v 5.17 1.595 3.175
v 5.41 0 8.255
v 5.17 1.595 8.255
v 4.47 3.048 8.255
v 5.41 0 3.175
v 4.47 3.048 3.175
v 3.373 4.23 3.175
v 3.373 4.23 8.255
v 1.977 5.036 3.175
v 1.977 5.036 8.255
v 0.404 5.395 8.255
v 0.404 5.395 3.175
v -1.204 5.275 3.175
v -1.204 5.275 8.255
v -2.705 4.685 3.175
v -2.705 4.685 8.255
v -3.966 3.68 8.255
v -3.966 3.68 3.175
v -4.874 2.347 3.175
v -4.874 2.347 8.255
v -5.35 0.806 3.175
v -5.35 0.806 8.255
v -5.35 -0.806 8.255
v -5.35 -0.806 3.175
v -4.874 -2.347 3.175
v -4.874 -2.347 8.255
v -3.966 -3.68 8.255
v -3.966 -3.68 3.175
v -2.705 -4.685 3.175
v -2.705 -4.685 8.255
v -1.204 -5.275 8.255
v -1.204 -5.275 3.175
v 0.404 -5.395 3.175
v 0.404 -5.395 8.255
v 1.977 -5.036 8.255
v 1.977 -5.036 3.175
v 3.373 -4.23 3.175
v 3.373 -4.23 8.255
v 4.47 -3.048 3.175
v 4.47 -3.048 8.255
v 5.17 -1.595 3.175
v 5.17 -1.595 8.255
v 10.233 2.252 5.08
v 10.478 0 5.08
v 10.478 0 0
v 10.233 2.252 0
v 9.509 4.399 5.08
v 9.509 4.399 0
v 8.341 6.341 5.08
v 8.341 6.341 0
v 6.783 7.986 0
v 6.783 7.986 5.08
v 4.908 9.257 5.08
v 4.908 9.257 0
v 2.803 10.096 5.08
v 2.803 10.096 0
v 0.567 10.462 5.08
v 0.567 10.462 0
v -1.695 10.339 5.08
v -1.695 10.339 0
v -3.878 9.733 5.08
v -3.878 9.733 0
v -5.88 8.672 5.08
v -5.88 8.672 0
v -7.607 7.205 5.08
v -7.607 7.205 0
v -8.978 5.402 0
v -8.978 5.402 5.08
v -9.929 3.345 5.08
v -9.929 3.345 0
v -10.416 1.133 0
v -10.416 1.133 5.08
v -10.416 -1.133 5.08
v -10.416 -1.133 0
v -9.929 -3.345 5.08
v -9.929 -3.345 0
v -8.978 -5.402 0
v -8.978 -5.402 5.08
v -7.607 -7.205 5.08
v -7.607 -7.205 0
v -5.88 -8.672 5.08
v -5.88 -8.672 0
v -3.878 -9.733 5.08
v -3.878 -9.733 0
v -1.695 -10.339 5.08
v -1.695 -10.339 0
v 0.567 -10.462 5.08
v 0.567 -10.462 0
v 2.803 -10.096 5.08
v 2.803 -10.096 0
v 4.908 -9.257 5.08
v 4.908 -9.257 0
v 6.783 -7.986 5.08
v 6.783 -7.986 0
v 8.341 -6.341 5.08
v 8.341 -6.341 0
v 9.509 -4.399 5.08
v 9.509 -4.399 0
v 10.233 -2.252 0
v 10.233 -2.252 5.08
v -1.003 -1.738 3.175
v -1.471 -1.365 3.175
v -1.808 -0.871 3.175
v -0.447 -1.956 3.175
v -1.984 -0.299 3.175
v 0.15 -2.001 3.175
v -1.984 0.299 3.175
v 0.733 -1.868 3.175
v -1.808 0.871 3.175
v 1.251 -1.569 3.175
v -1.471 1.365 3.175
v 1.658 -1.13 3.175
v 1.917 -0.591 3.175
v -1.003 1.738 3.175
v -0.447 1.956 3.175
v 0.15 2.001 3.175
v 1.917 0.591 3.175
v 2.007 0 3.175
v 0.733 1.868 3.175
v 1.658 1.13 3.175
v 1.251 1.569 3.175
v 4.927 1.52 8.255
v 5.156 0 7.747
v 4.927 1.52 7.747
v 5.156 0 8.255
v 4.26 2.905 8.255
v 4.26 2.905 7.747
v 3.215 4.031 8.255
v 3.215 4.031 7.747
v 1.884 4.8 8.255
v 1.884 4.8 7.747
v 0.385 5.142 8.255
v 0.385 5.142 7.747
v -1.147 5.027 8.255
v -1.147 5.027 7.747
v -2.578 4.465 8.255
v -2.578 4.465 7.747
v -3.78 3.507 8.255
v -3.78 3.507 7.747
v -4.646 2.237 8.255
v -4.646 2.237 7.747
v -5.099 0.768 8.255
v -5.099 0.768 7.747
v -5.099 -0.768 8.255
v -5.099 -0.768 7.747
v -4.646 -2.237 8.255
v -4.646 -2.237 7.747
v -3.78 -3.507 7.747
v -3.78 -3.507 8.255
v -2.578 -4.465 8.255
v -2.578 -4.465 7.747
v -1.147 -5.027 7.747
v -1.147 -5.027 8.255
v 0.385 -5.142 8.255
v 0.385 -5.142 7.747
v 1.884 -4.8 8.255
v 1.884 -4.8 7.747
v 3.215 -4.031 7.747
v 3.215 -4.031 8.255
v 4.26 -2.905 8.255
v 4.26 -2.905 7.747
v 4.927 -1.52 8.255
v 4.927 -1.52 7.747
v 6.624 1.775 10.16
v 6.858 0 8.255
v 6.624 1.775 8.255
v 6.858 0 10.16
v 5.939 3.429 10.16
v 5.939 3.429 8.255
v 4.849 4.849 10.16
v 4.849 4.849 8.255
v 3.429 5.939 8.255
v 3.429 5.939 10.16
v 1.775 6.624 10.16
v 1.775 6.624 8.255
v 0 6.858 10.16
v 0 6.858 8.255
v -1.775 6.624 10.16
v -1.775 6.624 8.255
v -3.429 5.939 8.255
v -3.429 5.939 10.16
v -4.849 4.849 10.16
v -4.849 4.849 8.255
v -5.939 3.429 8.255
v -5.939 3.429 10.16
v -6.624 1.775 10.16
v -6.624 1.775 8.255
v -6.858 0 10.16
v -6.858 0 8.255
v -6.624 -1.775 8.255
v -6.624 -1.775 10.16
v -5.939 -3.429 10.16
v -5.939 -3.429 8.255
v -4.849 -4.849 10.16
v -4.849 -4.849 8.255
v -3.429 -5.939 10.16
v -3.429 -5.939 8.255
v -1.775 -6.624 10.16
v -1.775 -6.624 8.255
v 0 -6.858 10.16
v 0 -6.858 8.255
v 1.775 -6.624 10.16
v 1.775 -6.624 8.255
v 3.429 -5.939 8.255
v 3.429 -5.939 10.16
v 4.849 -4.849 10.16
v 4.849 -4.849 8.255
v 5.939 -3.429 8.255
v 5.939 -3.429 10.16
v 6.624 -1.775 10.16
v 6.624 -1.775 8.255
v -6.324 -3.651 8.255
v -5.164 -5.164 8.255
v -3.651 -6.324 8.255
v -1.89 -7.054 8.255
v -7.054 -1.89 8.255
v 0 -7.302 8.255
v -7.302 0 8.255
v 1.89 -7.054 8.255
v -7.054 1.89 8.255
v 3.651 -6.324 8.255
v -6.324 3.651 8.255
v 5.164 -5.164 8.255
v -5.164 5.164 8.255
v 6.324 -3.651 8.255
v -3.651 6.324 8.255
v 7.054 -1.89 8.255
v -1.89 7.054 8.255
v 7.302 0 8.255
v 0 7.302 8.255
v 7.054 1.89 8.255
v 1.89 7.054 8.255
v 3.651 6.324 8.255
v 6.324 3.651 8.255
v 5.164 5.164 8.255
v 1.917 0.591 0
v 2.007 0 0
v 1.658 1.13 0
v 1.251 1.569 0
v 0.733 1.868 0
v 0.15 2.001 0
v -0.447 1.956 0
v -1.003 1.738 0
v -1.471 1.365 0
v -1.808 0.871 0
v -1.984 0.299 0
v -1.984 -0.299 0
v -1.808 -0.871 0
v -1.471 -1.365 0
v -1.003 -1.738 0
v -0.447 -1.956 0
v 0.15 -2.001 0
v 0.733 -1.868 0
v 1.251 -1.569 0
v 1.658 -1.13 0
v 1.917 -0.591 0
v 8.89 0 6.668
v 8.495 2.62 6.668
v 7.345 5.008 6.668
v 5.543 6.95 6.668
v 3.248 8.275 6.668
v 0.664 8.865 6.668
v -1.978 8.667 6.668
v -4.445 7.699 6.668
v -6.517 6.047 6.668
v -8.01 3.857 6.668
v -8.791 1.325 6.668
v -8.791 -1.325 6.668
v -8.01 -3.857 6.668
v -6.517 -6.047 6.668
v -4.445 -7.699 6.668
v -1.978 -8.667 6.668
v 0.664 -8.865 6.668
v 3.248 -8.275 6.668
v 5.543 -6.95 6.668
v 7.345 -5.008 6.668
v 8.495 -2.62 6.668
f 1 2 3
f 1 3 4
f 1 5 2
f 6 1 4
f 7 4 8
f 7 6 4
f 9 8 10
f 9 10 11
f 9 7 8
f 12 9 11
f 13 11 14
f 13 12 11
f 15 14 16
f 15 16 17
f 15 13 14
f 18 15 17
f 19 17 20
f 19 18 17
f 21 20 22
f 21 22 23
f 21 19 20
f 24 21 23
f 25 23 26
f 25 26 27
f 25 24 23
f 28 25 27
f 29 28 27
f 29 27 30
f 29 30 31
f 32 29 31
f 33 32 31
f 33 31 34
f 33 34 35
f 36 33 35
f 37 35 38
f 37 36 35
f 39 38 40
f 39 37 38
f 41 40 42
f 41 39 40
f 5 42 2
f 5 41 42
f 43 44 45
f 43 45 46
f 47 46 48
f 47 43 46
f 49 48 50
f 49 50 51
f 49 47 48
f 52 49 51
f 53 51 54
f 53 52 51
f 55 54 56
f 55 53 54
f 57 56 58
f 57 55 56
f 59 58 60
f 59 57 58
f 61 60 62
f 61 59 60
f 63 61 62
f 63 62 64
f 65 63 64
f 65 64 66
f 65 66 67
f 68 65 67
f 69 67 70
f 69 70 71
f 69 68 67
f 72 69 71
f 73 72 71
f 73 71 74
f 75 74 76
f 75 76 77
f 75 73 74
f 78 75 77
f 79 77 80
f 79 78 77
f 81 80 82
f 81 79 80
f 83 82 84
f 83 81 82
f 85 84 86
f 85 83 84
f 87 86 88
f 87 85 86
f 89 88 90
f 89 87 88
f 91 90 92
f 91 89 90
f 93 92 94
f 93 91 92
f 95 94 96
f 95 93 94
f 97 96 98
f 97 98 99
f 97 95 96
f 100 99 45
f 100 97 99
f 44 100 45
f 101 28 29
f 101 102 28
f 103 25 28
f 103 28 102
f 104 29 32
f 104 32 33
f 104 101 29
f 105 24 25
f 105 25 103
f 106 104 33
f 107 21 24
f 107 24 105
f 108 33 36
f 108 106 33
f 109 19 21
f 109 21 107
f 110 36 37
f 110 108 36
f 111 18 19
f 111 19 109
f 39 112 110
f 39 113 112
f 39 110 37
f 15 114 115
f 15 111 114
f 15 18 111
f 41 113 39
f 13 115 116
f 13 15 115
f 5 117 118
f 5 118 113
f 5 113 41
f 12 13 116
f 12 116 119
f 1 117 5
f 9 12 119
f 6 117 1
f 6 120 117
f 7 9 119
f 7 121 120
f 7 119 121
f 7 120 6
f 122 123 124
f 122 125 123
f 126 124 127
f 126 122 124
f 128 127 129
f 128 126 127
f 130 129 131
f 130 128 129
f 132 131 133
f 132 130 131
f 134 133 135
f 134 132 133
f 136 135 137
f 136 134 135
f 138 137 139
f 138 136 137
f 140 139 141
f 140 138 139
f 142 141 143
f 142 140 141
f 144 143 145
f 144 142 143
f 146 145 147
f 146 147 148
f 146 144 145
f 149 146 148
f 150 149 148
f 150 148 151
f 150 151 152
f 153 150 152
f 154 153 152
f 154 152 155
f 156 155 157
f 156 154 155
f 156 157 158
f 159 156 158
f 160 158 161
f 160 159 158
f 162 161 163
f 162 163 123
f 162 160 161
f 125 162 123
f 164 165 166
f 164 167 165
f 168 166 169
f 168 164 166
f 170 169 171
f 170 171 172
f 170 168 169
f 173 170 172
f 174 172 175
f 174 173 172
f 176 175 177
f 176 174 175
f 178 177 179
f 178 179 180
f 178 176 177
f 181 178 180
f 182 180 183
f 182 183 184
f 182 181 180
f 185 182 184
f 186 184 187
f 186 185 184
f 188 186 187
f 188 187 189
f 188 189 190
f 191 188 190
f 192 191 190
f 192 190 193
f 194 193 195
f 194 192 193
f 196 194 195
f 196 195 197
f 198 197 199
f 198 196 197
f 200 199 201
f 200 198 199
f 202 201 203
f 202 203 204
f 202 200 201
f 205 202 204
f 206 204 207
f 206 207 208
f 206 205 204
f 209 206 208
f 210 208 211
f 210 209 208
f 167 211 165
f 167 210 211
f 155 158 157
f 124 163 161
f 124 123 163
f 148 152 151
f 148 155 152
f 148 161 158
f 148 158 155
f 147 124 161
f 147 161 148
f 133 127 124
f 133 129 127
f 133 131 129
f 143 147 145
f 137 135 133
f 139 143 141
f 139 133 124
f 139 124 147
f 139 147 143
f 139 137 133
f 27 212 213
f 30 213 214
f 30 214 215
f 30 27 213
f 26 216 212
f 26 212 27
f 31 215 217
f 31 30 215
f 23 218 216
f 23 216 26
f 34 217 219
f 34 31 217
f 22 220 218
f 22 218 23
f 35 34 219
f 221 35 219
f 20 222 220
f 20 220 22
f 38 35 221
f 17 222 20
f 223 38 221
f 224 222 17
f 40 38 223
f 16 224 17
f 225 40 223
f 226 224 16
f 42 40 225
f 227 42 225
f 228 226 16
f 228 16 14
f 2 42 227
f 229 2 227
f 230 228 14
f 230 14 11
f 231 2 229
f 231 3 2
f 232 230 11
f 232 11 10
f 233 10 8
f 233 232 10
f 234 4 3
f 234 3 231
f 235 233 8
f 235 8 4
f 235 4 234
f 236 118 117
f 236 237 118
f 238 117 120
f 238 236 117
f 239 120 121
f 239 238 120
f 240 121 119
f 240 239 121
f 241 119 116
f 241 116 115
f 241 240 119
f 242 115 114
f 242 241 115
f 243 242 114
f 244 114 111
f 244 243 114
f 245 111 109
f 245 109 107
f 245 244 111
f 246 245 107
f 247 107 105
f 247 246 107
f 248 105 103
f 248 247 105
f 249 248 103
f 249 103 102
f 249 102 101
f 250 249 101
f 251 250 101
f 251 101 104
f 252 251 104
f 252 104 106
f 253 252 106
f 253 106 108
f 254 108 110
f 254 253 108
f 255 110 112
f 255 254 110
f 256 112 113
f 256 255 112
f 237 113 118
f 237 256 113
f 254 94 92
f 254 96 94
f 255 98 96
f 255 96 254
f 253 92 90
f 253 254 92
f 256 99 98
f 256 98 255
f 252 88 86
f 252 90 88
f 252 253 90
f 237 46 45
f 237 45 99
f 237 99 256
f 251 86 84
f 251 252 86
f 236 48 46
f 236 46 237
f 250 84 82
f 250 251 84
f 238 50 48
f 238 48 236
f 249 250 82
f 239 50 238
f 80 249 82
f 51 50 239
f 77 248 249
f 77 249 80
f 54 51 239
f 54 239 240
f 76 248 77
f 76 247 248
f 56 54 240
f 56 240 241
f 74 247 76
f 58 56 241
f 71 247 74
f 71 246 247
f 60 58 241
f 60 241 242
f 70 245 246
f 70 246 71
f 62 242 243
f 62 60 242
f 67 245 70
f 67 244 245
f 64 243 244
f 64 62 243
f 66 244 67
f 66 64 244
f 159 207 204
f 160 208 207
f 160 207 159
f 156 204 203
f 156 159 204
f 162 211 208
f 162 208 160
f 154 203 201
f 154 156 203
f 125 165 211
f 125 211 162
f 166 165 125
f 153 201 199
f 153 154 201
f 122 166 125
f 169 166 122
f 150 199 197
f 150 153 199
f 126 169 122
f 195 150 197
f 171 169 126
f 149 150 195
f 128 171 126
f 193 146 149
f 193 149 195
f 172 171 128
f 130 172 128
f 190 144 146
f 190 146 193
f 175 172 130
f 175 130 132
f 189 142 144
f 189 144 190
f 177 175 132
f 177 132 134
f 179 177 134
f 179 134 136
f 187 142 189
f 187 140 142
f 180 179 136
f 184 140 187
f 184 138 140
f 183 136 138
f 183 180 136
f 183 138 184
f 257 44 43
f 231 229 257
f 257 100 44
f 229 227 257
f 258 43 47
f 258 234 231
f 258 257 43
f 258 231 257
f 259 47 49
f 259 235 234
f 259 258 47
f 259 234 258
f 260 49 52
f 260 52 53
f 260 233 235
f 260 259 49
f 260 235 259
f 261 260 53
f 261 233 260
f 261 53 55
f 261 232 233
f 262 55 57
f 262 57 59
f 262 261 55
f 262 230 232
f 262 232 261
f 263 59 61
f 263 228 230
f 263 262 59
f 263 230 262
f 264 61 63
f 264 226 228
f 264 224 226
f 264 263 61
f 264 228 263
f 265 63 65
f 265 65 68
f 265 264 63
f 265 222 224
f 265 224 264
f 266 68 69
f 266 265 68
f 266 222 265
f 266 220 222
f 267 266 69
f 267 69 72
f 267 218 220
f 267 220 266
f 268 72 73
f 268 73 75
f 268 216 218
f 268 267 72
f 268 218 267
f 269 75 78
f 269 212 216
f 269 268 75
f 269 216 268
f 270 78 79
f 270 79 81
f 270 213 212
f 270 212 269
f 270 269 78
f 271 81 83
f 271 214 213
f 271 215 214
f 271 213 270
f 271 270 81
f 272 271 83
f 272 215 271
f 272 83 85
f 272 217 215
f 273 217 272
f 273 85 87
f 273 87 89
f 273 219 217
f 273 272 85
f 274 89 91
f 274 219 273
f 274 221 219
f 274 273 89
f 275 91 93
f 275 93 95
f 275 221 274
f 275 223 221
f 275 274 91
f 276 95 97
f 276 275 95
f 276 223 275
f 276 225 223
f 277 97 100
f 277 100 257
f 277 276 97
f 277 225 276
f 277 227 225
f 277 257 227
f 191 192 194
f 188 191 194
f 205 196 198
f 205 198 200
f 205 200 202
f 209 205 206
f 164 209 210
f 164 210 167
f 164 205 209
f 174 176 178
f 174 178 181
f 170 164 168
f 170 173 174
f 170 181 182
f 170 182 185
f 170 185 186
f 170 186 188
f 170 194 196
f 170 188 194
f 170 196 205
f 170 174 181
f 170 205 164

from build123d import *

# Parameters (mm, degrees)
F2_SIZE = 3.175


with BuildPart() as f1:
    # F0 (on Front) → F1 (revolve)
    with BuildSketch(Plane.XZ):
        Polygon((2.0066, 3.175), (2.0066, 0), (10.4775, 0), (10.4775, 8.255), (5.4102, 8.255), (5.4102, 3.175), align=None)
    revolve(axis=Axis((0, 0, 4.1275), (0, 0, 1)))

    # F2
    f2_edges = [f1.edges().sort_by_distance(p)[0] for p in [
        (-10.4775, 0, 8.255),
    ]]
    chamfer(f2_edges, length=F2_SIZE)


with BuildPart() as f4:
    # F3 (on Front) → F4 (revolve)
    with BuildSketch(Plane.XZ):
        Polygon((0, 10.16), (0, 7.747), (5.1562, 7.747), (5.1562, 8.255), (6.858, 8.255), (6.858, 10.16), align=None)
    revolve(axis=Axis((0, 0, 8.9535), (0, 0, 1)))


solid = Compound([f1.part, f4.part])
